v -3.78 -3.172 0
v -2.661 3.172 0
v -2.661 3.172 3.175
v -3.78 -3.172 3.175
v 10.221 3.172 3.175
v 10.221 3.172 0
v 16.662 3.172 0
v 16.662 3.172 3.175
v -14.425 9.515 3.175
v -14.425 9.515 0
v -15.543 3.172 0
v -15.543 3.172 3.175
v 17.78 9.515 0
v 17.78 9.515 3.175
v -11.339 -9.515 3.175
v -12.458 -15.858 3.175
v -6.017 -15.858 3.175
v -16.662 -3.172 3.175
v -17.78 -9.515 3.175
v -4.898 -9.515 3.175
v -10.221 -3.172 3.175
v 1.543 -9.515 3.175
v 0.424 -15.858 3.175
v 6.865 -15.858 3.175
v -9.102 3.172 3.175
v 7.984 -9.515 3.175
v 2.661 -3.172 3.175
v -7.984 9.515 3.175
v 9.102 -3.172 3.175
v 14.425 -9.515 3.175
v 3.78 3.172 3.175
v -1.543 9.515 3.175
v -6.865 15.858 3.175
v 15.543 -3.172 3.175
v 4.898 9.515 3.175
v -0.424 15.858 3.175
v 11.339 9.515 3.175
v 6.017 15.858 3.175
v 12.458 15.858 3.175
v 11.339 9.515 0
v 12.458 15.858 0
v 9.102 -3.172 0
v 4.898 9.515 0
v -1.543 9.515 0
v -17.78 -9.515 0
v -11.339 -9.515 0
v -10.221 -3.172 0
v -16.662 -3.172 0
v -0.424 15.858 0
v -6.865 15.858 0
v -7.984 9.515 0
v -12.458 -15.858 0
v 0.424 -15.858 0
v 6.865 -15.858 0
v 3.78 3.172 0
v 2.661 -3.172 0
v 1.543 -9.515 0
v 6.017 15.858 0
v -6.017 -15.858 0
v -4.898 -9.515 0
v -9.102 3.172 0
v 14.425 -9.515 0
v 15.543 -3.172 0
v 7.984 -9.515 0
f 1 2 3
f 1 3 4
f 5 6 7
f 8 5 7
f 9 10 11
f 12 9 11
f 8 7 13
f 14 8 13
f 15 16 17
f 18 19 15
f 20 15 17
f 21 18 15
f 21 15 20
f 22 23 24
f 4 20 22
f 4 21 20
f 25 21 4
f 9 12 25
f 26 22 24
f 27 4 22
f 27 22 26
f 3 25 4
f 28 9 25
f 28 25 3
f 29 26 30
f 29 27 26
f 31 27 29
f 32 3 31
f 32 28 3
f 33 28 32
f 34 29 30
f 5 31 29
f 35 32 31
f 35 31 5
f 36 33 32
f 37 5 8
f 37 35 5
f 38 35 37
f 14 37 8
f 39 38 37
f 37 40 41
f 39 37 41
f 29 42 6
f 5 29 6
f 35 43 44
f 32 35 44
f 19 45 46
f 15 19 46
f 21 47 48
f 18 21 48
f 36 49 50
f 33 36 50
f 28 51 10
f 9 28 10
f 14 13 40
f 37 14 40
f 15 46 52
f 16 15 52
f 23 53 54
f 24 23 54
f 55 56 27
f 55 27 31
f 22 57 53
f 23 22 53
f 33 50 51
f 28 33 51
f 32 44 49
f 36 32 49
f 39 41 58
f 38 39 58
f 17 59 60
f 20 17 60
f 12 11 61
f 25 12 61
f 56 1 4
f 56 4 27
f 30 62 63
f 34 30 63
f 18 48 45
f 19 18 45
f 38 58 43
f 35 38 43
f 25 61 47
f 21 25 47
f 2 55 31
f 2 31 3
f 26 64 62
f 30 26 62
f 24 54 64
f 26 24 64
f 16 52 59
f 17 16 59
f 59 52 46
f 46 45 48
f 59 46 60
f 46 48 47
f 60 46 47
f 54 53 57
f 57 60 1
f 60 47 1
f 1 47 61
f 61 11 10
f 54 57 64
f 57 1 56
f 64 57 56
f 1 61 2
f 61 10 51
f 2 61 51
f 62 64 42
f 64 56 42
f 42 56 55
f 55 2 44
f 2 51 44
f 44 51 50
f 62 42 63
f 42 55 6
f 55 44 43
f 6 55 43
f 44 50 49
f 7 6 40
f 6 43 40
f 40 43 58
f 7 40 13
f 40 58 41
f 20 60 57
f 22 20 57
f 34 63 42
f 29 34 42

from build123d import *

# Parameters (mm, degrees)
PAD_DEPTH = 3.175


with BuildPart() as part:
    # Sketch → Pad (new body)
    with BuildSketch(Plane.XY):
        Polygon((-14.424634, 9.514612), (-15.54309, 3.171537), (-9.102163, 3.171537), (-10.220618, -3.171537), (-16.661545, -3.171537), (-17.78, -9.514612), (-11.339073, -9.514612), (-12.457528, -15.857687), (-6.016601, -15.857687), (-4.898146, -9.514612), (1.542781, -9.514612), (0.424325, -15.857687), (6.865252, -15.857687), (7.983707, -9.514612), (14.424634, -9.514612), (15.54309, -3.171537), (9.102163, -3.171537), (10.220618, 3.171537), (16.661545, 3.171537), (17.78, 9.514612), (11.339073, 9.514612), (12.457528, 15.857687), (6.016601, 15.857687), (4.898146, 9.514612), (-1.542781, 9.514612), (-0.424325, 15.857687), (-6.865252, 15.857687), (-7.983707, 9.514612), align=None)
        Polygon((-2.661236, 3.171537), (-3.779691, -3.171537), (2.661236, -3.171537), (3.779691, 3.171537), align=None, mode=Mode.SUBTRACT)
    extrude(amount=PAD_DEPTH)


solid = part.part
